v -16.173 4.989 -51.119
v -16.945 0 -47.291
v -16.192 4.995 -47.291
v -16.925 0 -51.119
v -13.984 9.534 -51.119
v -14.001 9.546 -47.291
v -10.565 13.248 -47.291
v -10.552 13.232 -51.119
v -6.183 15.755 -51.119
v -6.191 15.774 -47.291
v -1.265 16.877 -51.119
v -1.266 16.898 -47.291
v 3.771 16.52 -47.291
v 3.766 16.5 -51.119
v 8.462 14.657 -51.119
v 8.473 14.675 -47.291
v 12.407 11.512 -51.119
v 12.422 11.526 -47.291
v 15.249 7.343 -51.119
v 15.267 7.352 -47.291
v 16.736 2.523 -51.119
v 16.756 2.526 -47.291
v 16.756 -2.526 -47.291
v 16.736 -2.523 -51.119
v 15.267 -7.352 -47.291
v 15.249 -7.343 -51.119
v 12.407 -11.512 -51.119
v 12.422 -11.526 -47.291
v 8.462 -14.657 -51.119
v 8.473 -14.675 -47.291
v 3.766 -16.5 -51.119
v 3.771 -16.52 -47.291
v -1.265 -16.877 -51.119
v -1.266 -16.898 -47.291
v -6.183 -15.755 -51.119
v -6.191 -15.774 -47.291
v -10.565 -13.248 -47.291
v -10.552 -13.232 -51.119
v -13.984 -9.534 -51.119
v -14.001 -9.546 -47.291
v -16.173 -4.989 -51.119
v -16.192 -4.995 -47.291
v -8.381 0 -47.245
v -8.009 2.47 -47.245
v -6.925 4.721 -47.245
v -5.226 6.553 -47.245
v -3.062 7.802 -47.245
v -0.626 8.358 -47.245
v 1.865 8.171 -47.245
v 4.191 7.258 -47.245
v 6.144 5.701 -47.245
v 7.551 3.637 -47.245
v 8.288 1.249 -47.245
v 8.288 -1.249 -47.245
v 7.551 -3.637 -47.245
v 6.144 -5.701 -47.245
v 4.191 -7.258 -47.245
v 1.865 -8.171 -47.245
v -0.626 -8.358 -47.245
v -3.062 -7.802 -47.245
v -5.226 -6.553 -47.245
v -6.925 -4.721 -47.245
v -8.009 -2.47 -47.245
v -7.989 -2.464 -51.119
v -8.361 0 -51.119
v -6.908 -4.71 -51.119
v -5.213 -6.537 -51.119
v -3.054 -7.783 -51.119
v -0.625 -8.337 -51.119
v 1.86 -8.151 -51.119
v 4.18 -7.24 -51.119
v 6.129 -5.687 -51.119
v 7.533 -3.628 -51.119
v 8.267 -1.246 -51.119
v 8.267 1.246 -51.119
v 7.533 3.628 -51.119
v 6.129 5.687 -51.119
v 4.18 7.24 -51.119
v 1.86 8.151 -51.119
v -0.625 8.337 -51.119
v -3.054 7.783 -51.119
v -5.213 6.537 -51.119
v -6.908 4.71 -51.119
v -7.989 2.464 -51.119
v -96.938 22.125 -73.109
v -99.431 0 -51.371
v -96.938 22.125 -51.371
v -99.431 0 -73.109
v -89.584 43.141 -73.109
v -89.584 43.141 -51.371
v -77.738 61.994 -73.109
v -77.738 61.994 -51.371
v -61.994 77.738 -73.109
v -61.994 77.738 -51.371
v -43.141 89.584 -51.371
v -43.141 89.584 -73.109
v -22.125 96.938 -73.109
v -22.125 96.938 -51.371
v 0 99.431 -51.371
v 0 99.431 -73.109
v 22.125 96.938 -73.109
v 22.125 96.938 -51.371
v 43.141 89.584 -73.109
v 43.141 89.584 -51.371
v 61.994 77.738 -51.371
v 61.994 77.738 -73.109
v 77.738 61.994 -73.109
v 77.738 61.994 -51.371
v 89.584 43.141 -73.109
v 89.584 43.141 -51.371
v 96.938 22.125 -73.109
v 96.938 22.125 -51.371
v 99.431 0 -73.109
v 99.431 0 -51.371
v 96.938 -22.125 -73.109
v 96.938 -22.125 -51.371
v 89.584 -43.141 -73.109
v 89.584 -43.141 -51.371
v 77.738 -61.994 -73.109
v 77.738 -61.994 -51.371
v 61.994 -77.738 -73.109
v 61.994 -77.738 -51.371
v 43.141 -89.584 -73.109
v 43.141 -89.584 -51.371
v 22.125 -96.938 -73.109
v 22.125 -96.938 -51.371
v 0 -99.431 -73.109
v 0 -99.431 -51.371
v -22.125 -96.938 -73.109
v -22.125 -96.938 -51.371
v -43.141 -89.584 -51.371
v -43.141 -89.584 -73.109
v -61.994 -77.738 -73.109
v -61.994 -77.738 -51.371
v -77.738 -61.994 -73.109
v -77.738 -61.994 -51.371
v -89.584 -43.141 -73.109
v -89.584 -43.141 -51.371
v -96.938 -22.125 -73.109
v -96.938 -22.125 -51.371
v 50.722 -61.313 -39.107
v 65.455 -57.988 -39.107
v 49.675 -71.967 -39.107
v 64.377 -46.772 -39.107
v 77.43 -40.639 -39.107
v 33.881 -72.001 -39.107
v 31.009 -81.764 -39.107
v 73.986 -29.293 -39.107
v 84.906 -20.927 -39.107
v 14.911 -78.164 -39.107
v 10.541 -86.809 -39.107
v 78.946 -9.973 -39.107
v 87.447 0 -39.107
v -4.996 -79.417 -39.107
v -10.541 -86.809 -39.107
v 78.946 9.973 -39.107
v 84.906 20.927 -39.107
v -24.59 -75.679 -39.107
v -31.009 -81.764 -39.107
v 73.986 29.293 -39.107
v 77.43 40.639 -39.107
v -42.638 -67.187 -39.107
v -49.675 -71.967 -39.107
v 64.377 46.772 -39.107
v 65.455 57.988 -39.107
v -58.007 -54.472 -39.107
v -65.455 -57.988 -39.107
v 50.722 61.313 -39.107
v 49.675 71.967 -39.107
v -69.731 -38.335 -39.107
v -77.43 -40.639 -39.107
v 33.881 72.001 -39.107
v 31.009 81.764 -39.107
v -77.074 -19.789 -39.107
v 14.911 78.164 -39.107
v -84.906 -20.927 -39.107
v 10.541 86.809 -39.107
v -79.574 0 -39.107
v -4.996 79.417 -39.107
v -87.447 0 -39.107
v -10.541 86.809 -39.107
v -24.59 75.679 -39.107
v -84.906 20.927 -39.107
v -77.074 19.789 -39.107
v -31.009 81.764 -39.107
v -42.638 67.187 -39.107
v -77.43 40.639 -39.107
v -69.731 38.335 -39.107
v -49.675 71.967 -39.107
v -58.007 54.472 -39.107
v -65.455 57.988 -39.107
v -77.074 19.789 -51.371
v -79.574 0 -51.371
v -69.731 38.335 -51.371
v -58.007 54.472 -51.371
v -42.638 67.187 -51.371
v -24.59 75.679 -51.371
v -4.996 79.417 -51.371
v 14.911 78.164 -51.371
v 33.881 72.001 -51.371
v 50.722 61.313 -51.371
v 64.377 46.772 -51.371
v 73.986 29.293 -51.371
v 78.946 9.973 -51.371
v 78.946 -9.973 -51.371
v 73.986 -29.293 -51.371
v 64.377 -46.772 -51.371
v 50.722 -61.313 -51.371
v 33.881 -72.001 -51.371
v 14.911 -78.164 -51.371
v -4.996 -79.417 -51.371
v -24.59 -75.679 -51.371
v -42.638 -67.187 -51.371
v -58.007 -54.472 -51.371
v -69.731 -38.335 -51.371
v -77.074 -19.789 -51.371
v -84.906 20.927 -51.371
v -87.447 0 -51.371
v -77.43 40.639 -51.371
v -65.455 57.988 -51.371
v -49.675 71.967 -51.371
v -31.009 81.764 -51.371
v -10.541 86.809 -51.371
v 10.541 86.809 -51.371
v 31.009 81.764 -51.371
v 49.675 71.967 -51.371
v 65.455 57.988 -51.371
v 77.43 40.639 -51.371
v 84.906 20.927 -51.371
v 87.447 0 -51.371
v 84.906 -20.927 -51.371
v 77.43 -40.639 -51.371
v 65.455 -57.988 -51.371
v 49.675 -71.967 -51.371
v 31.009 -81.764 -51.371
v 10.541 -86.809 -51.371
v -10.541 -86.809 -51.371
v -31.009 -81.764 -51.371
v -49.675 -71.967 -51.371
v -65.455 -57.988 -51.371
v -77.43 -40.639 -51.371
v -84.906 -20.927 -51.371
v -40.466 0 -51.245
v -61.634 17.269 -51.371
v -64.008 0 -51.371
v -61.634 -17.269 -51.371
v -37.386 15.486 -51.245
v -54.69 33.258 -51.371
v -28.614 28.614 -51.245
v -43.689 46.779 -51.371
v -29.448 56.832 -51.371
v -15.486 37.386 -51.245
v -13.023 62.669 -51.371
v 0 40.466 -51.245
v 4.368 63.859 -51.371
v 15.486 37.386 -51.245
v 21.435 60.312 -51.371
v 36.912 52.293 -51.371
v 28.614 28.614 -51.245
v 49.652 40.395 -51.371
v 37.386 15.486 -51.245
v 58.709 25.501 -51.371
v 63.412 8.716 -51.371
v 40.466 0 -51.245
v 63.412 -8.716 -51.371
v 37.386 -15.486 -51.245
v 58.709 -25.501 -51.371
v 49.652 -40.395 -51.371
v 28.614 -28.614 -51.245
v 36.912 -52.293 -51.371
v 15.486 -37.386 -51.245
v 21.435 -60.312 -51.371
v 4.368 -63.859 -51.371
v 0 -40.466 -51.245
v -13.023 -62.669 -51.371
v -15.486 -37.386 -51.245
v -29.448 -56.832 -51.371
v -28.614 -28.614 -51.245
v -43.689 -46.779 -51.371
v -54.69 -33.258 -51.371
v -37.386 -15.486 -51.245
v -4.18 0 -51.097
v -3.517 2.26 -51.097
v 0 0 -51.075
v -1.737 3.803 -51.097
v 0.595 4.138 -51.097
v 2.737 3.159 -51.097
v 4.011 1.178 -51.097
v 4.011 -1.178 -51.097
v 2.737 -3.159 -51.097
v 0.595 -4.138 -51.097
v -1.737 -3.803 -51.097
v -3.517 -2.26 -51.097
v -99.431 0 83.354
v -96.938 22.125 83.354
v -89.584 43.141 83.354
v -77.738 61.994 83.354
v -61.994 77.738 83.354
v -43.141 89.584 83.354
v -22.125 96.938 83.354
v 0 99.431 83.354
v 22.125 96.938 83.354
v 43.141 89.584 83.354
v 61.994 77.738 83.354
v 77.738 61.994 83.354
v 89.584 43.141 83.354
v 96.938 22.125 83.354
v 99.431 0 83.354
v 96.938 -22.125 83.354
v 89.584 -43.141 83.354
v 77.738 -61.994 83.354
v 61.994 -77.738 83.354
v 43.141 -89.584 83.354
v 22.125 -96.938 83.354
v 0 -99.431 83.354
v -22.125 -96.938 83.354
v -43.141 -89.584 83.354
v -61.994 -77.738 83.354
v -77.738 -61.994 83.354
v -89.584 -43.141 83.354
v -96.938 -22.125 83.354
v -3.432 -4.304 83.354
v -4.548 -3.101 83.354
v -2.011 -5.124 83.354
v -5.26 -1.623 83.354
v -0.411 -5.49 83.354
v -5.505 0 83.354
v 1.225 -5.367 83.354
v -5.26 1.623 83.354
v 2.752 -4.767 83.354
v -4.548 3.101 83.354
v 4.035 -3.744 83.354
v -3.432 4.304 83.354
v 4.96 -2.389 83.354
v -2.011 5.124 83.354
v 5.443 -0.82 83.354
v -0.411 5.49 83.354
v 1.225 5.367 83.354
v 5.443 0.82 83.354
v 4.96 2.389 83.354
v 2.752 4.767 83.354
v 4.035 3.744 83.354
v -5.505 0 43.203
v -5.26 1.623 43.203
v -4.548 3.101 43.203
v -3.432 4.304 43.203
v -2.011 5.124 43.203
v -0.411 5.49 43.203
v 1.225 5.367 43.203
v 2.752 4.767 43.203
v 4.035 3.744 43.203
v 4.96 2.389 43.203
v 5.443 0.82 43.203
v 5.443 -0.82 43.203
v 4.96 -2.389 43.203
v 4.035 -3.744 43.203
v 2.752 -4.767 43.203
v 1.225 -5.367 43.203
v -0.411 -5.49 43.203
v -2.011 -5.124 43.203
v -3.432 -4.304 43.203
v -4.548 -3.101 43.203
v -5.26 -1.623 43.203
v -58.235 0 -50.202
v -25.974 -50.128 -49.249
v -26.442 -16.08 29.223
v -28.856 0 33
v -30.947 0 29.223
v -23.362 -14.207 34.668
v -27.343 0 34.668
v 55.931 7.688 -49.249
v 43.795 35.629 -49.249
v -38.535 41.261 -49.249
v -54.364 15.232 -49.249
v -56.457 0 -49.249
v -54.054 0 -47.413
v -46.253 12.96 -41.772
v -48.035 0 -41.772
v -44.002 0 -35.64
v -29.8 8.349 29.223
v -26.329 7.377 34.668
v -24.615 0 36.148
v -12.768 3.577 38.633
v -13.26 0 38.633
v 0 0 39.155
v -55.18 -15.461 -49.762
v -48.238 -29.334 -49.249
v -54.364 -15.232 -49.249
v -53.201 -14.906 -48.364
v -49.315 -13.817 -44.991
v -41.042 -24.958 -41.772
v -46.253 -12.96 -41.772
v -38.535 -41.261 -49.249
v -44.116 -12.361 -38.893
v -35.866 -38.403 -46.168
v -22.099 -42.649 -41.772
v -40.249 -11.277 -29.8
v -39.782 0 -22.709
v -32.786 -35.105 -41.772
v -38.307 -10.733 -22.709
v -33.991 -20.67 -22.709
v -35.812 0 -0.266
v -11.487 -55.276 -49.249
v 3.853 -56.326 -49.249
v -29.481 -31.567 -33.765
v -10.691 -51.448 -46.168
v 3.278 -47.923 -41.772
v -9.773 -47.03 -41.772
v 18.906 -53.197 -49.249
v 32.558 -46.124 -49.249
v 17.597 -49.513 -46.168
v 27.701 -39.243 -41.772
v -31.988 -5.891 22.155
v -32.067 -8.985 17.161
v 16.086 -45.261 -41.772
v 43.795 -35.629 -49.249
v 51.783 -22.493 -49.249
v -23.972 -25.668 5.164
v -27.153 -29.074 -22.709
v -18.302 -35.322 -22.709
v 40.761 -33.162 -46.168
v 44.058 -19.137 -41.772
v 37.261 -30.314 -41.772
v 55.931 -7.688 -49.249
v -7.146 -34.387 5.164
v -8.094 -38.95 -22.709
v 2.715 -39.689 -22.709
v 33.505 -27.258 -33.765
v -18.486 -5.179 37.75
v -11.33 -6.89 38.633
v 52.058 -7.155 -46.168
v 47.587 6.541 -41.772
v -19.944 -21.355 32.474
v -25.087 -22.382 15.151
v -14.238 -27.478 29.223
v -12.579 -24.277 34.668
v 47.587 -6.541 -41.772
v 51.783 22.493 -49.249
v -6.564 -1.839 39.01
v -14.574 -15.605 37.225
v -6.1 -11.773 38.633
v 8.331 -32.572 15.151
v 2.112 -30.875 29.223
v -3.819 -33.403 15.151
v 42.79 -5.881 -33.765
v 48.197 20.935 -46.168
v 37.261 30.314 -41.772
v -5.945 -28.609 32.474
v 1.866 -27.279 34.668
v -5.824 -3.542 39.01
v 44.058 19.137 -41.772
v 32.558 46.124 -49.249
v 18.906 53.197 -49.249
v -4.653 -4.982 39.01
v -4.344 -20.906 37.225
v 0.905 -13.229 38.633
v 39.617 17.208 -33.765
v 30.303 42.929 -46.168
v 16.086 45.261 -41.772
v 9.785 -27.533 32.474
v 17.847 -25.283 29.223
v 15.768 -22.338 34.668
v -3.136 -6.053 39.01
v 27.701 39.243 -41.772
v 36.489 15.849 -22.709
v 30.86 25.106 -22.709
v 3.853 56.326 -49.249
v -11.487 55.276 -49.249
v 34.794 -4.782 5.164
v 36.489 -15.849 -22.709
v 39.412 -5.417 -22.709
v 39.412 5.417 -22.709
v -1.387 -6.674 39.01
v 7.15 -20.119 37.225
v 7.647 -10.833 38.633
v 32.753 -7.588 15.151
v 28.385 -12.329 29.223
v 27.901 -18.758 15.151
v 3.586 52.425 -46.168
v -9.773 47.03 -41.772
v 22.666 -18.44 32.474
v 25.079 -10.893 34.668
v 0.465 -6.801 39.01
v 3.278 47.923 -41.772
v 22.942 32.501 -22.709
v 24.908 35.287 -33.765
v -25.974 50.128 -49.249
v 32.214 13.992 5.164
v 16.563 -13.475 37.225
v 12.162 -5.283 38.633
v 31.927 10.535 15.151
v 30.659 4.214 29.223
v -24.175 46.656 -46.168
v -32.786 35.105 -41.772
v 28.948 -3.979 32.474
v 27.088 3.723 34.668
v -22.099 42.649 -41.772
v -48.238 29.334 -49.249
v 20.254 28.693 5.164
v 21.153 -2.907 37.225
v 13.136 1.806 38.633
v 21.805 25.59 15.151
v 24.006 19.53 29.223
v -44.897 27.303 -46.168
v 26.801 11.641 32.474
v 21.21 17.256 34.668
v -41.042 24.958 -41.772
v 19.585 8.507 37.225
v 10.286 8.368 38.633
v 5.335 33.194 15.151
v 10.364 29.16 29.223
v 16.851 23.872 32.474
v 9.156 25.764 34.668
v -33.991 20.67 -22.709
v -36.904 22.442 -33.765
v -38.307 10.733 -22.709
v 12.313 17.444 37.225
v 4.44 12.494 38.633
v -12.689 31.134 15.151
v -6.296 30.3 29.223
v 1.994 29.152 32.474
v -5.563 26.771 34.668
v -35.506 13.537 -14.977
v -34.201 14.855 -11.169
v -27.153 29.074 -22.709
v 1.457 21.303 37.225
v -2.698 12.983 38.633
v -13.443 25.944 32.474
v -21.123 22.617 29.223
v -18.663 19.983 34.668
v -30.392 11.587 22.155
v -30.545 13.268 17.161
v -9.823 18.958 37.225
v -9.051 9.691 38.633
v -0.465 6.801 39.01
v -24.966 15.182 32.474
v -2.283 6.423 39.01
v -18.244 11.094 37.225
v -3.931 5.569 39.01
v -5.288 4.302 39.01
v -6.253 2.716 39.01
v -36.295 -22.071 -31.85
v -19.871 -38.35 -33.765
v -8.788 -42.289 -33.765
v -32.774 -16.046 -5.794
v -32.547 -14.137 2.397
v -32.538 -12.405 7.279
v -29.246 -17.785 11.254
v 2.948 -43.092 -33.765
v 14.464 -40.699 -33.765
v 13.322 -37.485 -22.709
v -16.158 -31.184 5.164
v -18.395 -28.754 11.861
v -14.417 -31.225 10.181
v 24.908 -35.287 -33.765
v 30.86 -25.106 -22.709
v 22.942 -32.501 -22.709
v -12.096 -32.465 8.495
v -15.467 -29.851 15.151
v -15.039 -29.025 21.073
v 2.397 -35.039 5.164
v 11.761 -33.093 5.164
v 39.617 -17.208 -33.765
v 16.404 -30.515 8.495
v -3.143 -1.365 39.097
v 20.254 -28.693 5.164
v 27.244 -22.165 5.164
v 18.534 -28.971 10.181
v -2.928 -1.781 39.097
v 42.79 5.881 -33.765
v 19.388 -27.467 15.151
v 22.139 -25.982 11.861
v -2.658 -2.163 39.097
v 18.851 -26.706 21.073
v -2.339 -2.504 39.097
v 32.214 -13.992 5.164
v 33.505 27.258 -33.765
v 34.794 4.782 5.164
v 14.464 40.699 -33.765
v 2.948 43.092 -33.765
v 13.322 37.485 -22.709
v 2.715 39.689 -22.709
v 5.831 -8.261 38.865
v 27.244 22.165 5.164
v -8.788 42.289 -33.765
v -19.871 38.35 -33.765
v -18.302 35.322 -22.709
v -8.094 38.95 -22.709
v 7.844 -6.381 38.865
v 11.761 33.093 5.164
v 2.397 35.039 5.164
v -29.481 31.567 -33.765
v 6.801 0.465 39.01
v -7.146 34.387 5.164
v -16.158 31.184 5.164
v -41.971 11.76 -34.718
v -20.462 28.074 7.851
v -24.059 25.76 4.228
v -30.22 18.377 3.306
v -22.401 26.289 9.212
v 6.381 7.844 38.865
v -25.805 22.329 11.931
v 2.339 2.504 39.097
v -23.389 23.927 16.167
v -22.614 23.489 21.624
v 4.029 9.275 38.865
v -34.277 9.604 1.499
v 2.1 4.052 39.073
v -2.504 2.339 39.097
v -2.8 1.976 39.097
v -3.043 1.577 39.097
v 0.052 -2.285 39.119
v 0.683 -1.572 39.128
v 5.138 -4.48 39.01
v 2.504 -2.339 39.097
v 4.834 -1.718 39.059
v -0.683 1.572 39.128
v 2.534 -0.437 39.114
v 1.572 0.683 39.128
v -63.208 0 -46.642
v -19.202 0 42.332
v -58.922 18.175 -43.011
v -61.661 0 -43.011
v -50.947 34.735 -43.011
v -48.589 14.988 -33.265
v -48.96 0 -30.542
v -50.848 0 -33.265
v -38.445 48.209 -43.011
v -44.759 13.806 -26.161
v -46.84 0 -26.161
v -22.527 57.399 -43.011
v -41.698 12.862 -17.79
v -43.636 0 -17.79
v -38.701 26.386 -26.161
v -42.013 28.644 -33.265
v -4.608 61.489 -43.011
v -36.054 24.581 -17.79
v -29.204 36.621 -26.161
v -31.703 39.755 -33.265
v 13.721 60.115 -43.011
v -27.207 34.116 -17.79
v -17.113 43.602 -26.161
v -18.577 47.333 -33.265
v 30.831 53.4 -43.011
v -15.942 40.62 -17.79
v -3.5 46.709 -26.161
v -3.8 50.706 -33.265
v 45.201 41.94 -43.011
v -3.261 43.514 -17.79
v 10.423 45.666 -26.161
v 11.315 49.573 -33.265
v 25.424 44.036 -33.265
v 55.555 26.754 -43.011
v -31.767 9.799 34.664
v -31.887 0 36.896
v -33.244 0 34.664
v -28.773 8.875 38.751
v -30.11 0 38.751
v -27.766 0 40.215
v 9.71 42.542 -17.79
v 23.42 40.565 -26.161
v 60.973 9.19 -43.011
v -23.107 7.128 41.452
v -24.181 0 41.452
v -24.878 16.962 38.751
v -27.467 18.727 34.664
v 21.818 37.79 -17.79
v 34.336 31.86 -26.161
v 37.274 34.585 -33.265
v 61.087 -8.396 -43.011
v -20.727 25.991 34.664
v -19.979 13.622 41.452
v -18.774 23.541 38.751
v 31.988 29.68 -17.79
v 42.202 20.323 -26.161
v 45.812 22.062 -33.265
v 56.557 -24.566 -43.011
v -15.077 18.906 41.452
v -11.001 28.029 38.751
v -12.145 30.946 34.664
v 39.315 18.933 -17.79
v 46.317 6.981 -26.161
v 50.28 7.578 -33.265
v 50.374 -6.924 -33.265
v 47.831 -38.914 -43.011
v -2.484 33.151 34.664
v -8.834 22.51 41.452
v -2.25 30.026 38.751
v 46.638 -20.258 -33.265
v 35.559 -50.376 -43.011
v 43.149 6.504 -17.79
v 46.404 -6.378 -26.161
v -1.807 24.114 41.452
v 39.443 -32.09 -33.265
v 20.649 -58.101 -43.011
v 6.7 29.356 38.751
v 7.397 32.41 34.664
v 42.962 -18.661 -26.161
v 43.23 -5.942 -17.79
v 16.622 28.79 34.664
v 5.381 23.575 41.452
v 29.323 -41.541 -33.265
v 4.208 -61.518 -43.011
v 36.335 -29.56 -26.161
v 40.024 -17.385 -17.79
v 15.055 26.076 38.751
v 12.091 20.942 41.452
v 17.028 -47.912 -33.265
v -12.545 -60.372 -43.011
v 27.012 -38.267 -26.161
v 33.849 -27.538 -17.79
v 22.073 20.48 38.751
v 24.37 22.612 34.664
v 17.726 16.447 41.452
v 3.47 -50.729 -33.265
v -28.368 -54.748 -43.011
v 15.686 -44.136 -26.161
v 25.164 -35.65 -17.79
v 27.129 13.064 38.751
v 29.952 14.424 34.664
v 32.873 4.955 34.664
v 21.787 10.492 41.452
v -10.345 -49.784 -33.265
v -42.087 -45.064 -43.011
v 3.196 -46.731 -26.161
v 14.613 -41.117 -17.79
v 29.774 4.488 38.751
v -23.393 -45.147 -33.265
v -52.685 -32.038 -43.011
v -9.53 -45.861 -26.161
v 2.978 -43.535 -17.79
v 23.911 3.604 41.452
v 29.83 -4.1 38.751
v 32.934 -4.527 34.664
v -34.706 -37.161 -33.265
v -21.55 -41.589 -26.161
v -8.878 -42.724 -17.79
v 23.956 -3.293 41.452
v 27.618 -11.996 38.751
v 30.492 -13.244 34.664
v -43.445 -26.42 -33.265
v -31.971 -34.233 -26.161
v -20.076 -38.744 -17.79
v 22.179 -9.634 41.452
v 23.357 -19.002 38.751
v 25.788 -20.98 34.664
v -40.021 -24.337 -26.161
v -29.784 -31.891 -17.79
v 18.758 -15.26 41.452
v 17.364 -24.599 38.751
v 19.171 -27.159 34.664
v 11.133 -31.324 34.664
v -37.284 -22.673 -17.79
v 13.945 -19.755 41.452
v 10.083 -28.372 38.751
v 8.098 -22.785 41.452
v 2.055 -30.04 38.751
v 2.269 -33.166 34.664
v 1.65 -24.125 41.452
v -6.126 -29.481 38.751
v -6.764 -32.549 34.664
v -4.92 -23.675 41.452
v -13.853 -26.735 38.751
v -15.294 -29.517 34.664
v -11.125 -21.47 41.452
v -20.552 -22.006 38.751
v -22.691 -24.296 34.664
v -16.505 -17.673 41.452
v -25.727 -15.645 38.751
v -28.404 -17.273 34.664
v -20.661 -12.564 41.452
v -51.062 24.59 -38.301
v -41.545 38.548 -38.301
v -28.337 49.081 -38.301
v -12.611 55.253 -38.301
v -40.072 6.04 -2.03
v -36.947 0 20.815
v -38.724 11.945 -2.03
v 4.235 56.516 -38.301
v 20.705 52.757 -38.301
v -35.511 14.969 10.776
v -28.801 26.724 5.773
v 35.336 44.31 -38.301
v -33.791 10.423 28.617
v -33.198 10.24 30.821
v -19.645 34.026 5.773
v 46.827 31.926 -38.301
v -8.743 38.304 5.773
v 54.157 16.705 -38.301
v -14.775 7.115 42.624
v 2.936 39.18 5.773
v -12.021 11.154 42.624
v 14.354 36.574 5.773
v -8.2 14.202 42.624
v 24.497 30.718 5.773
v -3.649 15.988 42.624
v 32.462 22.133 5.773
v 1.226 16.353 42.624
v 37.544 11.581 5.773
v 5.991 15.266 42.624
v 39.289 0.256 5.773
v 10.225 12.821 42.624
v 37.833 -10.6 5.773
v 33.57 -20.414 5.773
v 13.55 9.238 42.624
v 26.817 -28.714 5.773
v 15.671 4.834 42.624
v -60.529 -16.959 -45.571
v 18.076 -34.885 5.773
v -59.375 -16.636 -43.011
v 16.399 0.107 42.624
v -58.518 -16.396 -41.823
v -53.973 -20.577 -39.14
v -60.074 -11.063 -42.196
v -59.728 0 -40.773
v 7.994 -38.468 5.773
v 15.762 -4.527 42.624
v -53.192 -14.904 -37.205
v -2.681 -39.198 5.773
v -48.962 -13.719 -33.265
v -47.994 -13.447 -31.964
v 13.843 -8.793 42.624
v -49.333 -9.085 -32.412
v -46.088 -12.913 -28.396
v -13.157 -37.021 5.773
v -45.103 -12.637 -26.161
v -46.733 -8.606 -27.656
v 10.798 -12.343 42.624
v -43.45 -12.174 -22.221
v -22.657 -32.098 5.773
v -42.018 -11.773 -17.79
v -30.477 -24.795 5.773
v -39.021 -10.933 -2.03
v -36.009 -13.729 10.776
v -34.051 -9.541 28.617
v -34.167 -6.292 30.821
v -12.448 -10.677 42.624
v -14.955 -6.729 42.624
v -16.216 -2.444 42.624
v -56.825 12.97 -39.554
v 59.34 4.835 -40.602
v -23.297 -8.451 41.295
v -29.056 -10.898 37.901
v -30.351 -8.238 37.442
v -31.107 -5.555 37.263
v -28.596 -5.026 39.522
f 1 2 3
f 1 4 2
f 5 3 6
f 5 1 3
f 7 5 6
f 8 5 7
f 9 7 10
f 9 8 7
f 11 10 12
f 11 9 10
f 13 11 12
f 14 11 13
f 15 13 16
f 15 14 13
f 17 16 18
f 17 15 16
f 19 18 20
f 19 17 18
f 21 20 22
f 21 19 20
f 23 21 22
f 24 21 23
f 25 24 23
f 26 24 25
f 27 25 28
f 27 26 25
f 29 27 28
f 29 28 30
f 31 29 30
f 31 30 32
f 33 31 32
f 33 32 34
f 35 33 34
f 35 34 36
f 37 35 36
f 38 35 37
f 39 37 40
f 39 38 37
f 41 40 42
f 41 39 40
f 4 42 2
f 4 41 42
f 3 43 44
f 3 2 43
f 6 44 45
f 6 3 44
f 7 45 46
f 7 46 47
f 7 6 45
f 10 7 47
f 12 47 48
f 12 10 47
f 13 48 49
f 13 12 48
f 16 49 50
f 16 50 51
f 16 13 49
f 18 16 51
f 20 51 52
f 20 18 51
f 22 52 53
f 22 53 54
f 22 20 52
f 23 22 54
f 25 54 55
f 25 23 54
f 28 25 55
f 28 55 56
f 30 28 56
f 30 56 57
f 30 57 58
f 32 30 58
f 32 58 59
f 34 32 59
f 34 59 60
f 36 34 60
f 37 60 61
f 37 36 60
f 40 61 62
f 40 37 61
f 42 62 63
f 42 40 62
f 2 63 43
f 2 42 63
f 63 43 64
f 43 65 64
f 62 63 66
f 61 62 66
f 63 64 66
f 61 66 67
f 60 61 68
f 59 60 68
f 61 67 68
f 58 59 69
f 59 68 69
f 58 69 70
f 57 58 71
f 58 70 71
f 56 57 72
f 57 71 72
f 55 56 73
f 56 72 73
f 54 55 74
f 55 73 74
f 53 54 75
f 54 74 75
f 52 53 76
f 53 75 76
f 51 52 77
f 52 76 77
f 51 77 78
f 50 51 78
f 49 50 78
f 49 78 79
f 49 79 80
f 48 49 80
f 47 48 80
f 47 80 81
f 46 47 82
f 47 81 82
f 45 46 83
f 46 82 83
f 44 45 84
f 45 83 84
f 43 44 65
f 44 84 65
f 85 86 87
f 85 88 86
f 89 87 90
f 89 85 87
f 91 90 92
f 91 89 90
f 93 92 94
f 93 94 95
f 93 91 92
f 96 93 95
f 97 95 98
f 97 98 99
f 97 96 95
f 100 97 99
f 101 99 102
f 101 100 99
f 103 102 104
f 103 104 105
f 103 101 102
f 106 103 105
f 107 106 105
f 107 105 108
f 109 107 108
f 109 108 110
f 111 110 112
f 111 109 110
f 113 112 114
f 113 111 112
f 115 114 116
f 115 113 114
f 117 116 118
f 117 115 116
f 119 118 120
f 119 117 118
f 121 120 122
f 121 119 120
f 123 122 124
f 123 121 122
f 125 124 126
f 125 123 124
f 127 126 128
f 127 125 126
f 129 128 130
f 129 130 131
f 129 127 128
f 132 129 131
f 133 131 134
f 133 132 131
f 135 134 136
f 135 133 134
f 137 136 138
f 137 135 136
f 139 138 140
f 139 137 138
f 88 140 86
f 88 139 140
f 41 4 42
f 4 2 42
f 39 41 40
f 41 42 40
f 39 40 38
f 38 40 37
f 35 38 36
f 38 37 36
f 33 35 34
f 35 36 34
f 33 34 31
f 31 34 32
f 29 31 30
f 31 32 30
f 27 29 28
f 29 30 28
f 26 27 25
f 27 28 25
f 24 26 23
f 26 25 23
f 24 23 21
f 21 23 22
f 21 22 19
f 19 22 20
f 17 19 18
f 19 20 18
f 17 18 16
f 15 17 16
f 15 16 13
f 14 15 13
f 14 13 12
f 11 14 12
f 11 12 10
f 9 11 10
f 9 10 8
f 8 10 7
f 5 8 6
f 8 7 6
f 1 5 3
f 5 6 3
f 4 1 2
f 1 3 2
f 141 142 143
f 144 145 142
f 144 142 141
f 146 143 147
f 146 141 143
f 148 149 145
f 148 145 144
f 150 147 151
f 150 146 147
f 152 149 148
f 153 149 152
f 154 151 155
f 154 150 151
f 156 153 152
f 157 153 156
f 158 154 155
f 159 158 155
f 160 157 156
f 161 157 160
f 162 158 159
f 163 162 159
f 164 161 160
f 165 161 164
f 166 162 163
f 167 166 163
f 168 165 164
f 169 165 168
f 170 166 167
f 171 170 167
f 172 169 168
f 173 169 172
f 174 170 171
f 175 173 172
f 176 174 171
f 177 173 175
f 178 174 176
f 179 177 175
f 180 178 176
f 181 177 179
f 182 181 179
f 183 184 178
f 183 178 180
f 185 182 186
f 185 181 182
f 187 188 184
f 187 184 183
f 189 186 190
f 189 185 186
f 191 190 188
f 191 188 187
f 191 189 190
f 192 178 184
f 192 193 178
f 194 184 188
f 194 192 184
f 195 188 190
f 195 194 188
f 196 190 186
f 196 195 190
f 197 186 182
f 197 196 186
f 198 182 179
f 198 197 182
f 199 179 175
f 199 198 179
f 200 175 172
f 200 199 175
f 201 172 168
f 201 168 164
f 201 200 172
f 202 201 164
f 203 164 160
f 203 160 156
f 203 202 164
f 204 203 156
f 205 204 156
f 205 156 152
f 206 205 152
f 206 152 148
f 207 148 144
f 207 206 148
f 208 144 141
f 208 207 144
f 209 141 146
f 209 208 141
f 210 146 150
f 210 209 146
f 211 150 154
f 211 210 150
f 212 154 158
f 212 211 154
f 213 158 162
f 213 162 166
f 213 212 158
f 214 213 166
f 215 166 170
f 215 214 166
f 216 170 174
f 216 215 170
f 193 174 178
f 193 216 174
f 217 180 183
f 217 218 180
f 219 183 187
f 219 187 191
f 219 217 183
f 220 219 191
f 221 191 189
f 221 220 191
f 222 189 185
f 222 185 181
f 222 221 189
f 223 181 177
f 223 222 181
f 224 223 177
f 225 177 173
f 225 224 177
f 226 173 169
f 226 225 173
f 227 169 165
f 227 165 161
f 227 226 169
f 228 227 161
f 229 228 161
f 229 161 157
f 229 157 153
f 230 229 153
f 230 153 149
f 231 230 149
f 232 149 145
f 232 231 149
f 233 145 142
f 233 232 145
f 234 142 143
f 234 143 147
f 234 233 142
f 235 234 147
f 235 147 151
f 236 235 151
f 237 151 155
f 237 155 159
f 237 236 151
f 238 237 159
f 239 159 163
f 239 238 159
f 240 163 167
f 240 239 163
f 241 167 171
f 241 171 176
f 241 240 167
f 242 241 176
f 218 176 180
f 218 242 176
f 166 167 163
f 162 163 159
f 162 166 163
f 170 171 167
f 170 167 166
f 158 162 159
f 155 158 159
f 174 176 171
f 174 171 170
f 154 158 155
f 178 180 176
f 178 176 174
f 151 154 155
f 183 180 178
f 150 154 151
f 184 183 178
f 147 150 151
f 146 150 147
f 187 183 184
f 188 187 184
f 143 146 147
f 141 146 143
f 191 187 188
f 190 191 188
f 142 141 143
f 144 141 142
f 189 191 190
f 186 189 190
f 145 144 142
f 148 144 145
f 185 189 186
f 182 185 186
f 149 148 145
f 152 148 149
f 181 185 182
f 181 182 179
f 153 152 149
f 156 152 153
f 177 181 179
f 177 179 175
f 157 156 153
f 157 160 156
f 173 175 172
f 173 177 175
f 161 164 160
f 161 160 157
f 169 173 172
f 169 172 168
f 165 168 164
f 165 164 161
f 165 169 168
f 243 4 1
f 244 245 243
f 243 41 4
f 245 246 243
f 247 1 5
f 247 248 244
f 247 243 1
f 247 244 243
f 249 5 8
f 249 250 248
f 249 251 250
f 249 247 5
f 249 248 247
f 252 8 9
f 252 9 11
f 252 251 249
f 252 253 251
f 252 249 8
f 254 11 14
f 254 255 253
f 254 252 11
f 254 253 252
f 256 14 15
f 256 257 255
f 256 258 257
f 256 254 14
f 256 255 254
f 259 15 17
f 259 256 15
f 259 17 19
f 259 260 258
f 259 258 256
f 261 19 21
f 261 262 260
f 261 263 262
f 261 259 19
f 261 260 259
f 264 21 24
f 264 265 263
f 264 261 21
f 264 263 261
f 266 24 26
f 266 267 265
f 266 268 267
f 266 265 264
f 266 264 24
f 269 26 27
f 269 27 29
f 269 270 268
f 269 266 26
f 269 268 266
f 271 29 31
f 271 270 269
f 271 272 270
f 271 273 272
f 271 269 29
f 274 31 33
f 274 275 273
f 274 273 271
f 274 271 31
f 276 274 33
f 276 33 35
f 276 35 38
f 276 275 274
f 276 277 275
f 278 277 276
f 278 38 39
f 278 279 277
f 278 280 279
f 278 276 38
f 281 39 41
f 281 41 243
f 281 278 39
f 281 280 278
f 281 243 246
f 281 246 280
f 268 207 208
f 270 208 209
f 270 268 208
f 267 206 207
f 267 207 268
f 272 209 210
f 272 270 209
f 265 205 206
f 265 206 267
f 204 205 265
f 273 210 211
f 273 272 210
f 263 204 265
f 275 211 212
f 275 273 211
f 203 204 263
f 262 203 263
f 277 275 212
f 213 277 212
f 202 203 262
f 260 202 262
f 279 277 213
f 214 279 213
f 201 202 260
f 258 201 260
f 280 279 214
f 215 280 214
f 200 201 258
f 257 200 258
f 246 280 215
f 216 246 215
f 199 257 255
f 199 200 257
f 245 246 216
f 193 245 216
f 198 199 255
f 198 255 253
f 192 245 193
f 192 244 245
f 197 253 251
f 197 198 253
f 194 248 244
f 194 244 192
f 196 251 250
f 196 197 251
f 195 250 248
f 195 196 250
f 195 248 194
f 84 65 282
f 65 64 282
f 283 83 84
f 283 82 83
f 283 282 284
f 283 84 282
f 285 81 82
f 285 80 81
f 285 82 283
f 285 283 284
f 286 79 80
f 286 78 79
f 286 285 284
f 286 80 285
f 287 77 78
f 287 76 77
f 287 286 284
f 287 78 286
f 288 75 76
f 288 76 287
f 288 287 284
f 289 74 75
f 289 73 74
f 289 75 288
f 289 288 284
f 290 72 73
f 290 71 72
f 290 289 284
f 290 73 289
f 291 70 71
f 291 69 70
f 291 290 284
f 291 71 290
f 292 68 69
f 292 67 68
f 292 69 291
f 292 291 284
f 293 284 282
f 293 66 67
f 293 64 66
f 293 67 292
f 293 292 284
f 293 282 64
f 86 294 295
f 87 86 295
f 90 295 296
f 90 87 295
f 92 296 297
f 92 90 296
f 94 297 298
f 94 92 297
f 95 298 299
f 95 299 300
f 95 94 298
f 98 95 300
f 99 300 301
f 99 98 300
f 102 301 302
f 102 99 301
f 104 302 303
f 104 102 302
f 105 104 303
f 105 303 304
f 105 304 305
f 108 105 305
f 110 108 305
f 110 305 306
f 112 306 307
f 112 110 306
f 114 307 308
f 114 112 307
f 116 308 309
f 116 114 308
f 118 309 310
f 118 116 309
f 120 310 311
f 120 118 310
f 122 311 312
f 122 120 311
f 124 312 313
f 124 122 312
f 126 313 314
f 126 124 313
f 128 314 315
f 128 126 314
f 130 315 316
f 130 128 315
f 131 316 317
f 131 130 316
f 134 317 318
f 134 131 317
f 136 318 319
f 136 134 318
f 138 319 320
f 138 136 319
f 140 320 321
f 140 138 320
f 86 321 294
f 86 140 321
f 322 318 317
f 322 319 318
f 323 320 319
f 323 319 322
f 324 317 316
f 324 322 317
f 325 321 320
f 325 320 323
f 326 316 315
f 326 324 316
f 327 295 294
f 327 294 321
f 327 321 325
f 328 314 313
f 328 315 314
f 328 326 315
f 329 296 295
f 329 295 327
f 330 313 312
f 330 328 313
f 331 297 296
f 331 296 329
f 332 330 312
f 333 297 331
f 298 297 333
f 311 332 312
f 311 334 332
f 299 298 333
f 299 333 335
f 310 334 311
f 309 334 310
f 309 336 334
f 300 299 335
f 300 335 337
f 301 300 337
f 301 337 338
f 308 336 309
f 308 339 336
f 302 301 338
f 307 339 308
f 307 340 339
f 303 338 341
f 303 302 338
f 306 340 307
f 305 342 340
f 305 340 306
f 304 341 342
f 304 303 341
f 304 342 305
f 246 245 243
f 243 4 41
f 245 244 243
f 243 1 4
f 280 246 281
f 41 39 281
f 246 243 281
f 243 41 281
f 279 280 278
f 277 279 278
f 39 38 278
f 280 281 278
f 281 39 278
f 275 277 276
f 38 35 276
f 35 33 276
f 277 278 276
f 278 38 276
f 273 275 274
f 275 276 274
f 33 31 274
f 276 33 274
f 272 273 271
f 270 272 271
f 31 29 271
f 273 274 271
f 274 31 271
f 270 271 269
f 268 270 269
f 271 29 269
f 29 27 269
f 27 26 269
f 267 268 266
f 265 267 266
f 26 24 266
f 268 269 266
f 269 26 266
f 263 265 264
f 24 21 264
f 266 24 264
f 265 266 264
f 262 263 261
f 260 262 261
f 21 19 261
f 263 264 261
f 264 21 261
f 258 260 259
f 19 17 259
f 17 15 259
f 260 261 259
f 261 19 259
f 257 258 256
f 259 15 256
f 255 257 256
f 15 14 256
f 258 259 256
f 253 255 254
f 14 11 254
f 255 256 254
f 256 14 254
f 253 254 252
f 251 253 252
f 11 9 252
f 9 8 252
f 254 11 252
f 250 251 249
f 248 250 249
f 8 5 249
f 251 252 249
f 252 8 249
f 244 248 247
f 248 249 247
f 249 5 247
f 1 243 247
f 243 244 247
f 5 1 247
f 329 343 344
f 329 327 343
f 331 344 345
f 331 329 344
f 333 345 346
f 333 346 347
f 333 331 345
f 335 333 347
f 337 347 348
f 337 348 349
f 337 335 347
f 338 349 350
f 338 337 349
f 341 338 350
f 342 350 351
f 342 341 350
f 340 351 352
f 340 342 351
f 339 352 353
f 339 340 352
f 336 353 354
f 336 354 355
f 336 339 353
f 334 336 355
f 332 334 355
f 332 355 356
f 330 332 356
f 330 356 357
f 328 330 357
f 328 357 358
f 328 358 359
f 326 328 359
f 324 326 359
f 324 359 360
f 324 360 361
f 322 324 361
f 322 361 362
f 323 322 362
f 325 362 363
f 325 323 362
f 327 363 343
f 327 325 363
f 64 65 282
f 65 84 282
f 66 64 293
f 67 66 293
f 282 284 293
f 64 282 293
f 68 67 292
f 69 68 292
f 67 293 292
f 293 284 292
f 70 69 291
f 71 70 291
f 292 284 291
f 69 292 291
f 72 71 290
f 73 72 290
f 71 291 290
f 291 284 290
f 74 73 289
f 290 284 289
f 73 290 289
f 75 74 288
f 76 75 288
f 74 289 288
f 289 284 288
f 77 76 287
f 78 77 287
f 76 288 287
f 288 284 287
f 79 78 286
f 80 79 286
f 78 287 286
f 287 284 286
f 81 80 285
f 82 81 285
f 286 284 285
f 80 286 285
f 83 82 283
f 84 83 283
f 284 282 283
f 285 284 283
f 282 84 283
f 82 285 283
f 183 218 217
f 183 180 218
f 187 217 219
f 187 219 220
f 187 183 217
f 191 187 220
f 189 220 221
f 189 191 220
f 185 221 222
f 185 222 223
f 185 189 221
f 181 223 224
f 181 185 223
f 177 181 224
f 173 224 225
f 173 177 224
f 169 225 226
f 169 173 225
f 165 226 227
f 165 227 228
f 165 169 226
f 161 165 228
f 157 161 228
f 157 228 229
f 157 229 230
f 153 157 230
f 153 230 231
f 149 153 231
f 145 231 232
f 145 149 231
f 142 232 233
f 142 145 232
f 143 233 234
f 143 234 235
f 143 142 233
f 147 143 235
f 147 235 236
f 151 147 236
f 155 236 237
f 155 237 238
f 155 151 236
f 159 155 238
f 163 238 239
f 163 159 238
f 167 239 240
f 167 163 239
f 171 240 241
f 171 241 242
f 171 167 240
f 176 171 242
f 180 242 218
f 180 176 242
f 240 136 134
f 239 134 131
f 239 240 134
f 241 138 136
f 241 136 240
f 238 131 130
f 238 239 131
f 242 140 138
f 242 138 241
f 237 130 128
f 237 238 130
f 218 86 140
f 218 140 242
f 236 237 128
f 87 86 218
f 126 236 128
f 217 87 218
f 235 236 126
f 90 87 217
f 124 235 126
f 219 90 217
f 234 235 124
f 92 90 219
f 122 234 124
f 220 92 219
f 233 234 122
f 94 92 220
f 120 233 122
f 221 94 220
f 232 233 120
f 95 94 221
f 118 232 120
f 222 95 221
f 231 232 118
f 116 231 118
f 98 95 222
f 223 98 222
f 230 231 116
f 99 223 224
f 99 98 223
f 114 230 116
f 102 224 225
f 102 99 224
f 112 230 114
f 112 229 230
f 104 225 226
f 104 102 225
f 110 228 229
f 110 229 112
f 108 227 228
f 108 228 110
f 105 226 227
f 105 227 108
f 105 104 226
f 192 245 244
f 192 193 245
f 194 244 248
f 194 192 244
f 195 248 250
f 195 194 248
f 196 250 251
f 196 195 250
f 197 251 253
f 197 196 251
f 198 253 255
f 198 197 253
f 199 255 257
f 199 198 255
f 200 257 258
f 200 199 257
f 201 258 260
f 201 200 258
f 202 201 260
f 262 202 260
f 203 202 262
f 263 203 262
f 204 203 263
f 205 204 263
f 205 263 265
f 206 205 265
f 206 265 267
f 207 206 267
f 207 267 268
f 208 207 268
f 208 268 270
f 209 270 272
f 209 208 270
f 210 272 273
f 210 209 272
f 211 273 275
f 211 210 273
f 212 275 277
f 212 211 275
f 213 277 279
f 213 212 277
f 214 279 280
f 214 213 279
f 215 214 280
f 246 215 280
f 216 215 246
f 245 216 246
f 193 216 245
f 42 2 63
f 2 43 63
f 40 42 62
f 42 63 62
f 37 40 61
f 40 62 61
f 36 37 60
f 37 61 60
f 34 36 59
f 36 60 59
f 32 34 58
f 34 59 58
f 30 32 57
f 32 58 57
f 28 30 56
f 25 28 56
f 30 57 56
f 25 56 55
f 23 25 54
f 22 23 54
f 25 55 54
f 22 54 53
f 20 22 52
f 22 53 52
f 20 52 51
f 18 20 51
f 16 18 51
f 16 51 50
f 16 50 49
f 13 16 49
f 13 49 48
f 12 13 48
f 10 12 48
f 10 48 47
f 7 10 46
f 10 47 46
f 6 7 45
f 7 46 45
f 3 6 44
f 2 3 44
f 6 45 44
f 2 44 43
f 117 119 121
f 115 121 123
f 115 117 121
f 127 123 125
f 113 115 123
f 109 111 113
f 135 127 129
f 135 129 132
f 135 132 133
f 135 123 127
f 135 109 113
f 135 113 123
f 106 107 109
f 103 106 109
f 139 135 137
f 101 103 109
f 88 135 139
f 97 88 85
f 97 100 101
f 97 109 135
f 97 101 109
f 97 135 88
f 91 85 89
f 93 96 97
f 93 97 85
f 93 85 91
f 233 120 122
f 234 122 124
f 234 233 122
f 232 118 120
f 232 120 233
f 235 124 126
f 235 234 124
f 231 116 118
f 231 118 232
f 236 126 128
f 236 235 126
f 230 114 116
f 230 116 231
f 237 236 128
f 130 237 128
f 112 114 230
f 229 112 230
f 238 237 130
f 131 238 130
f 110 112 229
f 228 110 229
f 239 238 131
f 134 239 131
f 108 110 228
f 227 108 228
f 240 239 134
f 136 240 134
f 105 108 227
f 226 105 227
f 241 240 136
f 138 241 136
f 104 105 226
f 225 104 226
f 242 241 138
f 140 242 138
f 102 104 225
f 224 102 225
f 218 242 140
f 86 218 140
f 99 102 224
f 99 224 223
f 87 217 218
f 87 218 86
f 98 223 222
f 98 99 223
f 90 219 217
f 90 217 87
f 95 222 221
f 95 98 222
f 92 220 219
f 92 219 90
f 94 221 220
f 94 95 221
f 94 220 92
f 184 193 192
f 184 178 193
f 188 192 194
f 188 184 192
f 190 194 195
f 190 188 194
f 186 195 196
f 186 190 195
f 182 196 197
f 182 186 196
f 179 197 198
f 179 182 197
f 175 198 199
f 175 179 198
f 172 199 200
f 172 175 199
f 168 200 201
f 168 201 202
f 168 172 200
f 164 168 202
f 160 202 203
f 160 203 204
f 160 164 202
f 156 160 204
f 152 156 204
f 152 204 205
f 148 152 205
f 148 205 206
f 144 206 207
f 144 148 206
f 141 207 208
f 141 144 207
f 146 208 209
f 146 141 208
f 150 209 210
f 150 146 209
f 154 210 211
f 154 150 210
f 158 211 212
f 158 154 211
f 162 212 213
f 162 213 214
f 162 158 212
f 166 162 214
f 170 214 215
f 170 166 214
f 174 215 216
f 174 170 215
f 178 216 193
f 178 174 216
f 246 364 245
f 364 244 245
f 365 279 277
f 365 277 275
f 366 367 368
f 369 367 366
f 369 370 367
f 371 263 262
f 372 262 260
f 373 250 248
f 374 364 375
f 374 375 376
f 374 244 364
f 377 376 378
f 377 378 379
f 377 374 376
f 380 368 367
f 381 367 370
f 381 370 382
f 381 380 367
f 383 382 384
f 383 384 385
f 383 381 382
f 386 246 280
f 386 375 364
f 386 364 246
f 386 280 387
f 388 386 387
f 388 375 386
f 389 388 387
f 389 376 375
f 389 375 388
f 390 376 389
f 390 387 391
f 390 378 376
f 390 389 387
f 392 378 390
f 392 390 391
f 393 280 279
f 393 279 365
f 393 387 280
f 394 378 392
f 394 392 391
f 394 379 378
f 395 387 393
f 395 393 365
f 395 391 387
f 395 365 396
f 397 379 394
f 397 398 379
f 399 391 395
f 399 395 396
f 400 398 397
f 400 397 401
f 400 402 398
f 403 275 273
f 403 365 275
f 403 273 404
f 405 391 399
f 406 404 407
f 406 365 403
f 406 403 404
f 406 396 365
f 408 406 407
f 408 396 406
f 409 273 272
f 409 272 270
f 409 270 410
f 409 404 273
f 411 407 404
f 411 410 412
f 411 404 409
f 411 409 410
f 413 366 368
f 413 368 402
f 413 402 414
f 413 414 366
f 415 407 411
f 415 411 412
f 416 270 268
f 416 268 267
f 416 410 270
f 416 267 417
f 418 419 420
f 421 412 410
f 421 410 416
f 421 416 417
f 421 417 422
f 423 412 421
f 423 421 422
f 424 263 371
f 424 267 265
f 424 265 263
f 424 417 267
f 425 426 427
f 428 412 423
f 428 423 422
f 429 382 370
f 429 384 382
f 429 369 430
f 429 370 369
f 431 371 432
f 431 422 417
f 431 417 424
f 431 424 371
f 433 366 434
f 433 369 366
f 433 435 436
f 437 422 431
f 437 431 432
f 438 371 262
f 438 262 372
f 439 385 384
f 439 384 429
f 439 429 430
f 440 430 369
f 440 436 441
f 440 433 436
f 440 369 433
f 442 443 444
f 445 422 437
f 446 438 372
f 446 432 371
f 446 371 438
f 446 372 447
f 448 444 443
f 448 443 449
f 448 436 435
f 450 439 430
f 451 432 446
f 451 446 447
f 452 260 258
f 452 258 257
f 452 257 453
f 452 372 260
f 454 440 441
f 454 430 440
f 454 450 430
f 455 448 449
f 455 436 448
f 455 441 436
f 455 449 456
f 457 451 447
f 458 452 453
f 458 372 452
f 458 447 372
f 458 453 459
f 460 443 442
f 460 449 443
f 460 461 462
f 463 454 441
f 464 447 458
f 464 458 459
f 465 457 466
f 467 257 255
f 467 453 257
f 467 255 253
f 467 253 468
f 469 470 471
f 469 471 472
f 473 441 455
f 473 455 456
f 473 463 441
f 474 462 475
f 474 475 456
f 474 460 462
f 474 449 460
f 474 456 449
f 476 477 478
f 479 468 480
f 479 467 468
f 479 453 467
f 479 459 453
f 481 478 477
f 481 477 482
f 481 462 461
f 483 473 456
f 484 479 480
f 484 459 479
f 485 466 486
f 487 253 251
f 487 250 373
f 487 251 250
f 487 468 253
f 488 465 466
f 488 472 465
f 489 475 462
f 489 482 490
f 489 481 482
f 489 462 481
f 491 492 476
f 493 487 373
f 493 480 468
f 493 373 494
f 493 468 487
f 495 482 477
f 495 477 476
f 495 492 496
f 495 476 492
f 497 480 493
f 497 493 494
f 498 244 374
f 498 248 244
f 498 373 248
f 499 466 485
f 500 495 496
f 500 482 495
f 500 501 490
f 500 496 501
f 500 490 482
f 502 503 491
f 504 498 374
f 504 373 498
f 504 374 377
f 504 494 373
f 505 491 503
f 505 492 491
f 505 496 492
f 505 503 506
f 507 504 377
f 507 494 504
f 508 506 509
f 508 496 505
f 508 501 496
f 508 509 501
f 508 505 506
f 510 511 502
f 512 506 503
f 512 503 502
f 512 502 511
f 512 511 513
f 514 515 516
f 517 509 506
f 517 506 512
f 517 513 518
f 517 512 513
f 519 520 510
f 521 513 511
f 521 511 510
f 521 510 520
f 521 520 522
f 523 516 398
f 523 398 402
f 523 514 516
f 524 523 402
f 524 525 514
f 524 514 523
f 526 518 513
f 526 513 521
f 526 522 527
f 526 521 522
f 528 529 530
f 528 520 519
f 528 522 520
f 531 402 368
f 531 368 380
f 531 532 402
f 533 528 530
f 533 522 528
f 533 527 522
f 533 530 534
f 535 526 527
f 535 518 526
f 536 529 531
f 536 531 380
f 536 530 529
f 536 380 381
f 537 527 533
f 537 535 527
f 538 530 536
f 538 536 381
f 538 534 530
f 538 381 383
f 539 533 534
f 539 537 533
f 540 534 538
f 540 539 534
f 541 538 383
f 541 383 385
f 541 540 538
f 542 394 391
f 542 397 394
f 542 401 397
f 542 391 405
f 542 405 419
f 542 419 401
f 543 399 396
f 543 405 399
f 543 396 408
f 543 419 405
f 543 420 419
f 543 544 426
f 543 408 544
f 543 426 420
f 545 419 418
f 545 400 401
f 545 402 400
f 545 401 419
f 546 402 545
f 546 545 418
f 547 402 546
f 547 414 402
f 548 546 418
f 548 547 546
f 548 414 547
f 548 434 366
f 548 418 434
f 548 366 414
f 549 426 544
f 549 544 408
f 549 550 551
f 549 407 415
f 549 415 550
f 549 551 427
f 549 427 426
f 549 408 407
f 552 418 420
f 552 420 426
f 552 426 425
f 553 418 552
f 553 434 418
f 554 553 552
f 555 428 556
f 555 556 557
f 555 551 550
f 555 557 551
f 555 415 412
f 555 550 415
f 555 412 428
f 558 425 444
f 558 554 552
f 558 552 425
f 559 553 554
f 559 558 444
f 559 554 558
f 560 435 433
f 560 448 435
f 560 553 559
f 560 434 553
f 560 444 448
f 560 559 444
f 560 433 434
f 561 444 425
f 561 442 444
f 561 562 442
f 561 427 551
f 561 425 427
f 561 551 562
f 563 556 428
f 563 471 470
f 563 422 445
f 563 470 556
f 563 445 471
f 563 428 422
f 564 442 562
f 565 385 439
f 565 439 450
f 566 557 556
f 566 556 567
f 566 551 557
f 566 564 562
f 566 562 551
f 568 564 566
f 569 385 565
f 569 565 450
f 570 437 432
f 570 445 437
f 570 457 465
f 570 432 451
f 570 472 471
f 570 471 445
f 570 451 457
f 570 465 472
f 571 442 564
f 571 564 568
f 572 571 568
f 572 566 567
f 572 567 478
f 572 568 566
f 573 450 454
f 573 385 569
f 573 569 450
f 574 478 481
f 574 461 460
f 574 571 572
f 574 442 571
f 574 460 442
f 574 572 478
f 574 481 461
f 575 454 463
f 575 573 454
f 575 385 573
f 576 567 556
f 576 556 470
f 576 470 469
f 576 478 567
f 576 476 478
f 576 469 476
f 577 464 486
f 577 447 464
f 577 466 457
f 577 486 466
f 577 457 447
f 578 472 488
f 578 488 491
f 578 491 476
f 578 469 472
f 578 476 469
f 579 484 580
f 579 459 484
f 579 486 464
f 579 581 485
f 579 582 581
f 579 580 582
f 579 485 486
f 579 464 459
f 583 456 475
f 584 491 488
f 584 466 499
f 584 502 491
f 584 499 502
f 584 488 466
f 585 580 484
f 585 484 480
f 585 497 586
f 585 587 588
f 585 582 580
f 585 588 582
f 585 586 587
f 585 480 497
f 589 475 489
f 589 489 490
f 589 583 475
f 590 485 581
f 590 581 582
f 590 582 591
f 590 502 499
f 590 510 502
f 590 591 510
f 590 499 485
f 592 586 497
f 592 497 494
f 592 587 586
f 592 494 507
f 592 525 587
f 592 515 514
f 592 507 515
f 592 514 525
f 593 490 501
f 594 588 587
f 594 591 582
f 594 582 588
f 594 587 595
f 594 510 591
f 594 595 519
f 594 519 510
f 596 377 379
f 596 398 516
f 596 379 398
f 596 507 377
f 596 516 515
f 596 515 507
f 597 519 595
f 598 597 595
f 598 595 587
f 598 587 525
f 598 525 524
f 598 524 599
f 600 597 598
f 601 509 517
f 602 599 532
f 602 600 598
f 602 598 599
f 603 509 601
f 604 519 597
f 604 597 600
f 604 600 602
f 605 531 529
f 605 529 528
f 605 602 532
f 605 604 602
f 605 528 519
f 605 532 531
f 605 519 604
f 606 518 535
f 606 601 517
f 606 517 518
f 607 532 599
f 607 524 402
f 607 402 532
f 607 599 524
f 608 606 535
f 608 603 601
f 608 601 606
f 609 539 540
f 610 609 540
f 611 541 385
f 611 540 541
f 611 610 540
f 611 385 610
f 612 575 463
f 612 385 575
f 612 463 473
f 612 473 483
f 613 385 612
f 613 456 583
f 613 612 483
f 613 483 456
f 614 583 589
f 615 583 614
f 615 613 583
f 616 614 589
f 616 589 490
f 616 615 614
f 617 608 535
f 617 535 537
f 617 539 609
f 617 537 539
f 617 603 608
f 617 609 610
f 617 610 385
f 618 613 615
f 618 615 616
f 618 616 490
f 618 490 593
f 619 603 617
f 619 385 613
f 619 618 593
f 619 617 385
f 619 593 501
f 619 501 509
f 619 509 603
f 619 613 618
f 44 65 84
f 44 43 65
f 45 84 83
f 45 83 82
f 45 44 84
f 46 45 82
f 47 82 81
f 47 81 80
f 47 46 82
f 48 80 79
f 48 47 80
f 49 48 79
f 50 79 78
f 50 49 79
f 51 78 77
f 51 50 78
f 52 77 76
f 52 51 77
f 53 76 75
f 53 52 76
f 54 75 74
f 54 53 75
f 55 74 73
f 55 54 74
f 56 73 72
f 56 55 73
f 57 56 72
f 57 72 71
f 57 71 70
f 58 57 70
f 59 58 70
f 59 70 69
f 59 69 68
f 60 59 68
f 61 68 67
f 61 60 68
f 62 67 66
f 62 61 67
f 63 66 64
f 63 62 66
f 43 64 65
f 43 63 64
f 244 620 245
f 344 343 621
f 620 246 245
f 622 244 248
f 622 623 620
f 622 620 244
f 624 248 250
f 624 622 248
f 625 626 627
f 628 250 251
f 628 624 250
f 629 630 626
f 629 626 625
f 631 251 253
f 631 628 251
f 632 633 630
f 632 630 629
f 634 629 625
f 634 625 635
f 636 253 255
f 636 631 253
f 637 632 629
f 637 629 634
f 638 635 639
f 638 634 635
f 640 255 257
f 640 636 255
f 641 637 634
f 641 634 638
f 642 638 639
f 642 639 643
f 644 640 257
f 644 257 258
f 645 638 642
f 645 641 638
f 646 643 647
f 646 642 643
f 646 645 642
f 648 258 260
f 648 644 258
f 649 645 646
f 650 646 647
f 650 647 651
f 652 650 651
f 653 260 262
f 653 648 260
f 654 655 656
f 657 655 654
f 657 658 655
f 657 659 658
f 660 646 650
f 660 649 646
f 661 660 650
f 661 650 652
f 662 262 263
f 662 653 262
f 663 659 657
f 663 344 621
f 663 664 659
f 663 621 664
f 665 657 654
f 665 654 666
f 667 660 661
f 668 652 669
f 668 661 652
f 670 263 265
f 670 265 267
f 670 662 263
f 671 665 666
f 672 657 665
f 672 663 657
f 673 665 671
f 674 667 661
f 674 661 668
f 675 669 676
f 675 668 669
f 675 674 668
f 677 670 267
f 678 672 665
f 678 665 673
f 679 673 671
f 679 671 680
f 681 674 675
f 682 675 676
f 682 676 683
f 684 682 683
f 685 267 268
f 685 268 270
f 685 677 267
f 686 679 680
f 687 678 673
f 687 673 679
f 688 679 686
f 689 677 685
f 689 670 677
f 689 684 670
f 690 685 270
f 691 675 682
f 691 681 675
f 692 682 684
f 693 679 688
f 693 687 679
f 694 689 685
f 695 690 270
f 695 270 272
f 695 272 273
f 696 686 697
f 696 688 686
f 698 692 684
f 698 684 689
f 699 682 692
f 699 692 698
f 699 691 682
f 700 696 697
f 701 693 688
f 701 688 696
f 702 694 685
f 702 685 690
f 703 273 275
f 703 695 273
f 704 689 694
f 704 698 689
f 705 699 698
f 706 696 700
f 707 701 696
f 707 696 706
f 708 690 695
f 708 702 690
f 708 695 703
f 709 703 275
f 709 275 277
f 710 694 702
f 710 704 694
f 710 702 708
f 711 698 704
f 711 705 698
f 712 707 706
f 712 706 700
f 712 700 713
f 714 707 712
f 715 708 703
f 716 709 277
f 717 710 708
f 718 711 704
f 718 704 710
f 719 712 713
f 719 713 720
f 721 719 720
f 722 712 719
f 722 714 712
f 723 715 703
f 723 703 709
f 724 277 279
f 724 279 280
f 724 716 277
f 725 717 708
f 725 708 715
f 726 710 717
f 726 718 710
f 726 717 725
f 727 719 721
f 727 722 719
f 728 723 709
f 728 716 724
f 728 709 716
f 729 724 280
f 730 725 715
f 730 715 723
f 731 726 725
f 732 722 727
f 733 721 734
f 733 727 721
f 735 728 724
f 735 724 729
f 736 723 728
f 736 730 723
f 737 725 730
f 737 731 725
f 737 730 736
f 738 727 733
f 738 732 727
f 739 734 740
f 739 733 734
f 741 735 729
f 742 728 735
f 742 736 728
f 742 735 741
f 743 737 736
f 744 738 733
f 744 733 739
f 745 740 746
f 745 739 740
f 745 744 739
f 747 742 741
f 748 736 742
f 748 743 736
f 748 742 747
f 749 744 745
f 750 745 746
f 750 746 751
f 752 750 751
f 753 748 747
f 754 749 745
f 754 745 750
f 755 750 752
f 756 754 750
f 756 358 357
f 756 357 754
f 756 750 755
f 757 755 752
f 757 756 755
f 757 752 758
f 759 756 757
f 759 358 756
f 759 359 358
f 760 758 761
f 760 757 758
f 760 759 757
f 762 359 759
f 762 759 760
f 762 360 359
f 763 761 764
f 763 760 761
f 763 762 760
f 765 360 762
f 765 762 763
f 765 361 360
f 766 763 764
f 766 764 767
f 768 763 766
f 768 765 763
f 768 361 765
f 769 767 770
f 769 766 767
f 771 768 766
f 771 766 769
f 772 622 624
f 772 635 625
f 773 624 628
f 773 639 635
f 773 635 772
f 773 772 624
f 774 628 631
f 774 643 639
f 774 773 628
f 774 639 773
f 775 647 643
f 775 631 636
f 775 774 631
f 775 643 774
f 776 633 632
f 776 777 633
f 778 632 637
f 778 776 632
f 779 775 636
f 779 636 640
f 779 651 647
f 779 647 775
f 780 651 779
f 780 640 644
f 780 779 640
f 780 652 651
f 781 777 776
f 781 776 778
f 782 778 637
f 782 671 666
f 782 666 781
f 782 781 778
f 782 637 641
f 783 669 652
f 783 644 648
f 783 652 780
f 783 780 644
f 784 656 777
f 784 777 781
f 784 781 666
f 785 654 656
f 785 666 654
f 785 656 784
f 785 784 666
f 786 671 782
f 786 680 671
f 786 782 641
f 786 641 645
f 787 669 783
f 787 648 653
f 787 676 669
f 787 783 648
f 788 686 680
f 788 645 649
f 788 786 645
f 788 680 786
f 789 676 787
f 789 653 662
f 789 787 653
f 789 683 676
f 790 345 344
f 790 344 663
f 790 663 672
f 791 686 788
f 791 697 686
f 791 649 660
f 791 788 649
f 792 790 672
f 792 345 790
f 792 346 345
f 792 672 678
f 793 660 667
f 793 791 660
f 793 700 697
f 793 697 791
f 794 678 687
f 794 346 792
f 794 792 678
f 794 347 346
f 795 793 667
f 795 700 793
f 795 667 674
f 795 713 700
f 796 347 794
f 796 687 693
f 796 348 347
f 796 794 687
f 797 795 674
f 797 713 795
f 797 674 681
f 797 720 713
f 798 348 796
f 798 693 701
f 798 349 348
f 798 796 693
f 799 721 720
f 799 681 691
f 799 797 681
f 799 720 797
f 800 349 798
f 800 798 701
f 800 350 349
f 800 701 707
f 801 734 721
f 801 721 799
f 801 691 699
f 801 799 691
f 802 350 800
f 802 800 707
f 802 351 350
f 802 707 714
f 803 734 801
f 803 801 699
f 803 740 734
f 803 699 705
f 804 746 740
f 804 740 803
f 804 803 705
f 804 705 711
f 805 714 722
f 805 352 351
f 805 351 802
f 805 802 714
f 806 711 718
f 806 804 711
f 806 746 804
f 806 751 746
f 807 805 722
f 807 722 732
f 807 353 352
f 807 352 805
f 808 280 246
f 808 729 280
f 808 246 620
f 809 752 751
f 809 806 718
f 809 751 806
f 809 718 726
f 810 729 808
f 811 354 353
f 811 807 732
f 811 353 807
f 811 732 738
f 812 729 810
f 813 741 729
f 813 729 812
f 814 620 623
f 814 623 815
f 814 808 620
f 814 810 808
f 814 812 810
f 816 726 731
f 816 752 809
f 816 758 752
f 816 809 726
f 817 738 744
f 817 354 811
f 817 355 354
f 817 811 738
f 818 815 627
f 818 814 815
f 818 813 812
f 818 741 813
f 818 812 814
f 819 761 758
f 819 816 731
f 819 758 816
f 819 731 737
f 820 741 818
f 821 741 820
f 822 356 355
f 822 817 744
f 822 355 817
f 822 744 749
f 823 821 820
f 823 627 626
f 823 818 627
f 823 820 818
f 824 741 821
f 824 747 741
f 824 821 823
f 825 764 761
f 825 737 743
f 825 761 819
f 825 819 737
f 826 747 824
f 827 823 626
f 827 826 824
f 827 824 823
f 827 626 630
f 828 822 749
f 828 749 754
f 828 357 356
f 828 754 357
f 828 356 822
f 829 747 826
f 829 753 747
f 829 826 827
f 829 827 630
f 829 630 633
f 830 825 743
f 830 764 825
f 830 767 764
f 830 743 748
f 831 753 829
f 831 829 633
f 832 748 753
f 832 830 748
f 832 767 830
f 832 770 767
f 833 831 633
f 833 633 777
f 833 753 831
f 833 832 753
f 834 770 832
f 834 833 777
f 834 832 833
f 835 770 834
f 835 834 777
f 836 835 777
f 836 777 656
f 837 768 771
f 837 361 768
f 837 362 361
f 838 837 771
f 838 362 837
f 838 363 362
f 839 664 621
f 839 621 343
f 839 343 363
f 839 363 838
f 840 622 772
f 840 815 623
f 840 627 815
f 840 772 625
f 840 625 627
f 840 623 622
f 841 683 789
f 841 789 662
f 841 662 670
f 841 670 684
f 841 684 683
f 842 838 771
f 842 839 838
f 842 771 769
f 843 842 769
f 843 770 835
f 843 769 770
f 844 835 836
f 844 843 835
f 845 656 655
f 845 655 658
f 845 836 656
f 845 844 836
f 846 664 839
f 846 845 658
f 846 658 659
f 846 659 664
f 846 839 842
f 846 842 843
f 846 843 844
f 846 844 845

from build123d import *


# Not quite as in the source:
# - ends of sketch curves that miss each other by under 0.0002 mm in the source are joined


with BuildPart() as f1:
    # F0 (on Front) → F1 (revolve)
    with BuildSketch(Plane.XZ):
        with BuildLine():
            Line((-5.5049625925, 43.2034109984), (-5.5049625925, 83.3543194161))
            Line((-5.5049625925, 83.3543194161), (-99.4309840389, 83.3543194161))
            Line((-99.4309840389, 83.3543194161), (-99.4309840389, -51.3714465576))
            Line((-99.4309840389, -51.3714465576), (-87.4468881672, -51.3714465576))
            Line((-87.4468881672, -51.3714465576), (-87.4468881672, -39.1072945867))
            Line((-87.4468881672, -39.1072945867), (-79.5739456842, -39.1072945867))
            Line((-79.5739456842, -39.1072945867), (-79.5739456842, -51.3714465576))
            Line((-79.5739456842, -51.3714465576), (-64.008, -51.3714465576))
            add(Edge.make_bspline(
                [(-64.008, -51.3714465576), (-64.1027038454, -49.839950803), (-62.7670473342, -44.0198094824), (-59.795903973, -40.557544581), (-54.6012246924, -36.8234386179), (-49.7372082623, -32.6662543777), (-46.8715955049, -26.175741387), (-43.5946465593, -19.1096878414), (-41.7681298564, -8.6181796833), (-40.0560318039, -0.0270351042), (-37.2140229768, 20.4769103307), (-34.5096956961, 33.4115075529), (-28.8439262592, 41.7285244533), (-17.6651301621, 42.8076889627), (-5.5049625925, 43.2034109984)],
                knots=[0, 0, 0, 0, 0.0708281388, 0.1296061177, 0.1961624378, 0.26371795, 0.3337316046, 0.4090991647, 0.494396835, 0.5753960354, 0.6970604735, 0.79528122, 0.8698391379, 1, 1, 1, 1], degree=3))
        make_face()
    revolve(axis=Axis((0, 0, -9.7730937459), (0, 0, -1)))


with BuildPart() as f3:
    # F2 (on Front) → F3 (revolve)
    with BuildSketch(Plane.XZ):
        with BuildLine():
            add(Edge.make_bspline(
                [(-64.008, -51.3714570016), (-62.1417719206, -51.1193087771), (-58.2184243409, -50.6835159057), (-54.80499818, -48.0288890525), (-50.869415203, -44.8556398767), (-44.9076833426, -38.6843511379), (-41.1418422638, -28.5836251876), (-36.8837585479, -11.3600621188), (-35.5512845454, 3.654102122), (-32.5751230407, 21.3452100724), (-31.6428957309, 28.546524663), (-28.6921245131, 33.535284546), (-26.2962108333, 35.7112909355), (-19.4360185112, 37.9818852252), (-10.8556993698, 38.9875847862), (-3.7151385315, 39.0980221276), (0, 39.1552485526)],
                knots=[0, 0, 0, 0, 0.0585835377, 0.1084324952, 0.1630098689, 0.2330534173, 0.3136392856, 0.4158345544, 0.5140429199, 0.6166278982, 0.6829616528, 0.7389680389, 0.7822413443, 0.8461057652, 0.9191022622, 1, 1, 1, 1], degree=3))
            Line((-64.008, -51.3714570016), (-16.9247925652, -51.1193087771))
            Line((-16.9247925652, -51.1193087771), (-16.9452934719, -47.2912094683))
            Line((-16.9452934719, -47.2912094683), (-8.3812896029, -47.2453460174))
            Line((-8.3812896029, -47.2453460174), (-8.3605430802, -51.1193087771))
            Line((-8.3605430802, -51.1193087771), (0, -51.074534935))
            Line((0, -51.074534935), (0, 39.1552485526))
        make_face()
    revolve(axis=Axis((0, 0, -5.9596431912), (0, 0, 1)))


with BuildPart() as f5:
    # F4 (on Front) → F5 (revolve)
    with BuildSketch(Plane.XZ):
        Polygon((-87.4468881672, -51.3714465576), (-99.4309840389, -51.3714465576), (-99.4309840389, -73.1087177992), (0, -73.1087177992), (0, -51.074534935), (-8.3605430802, -51.1193087771), (-8.3812896029, -47.2453460174), (-16.9452934719, -47.2912094683), (-16.9247925652, -51.1193087771), (-64.008, -51.3714570016), (-79.5739456842, -51.3714465576), (-79.5739456842, -39.1072945867), (-87.4468881672, -39.1072945867), align=None)
    revolve(axis=Axis((0, 0, -120.2870681882), (0, 0, -1)))


solid = Compound([f1.part, f3.part, f5.part])
